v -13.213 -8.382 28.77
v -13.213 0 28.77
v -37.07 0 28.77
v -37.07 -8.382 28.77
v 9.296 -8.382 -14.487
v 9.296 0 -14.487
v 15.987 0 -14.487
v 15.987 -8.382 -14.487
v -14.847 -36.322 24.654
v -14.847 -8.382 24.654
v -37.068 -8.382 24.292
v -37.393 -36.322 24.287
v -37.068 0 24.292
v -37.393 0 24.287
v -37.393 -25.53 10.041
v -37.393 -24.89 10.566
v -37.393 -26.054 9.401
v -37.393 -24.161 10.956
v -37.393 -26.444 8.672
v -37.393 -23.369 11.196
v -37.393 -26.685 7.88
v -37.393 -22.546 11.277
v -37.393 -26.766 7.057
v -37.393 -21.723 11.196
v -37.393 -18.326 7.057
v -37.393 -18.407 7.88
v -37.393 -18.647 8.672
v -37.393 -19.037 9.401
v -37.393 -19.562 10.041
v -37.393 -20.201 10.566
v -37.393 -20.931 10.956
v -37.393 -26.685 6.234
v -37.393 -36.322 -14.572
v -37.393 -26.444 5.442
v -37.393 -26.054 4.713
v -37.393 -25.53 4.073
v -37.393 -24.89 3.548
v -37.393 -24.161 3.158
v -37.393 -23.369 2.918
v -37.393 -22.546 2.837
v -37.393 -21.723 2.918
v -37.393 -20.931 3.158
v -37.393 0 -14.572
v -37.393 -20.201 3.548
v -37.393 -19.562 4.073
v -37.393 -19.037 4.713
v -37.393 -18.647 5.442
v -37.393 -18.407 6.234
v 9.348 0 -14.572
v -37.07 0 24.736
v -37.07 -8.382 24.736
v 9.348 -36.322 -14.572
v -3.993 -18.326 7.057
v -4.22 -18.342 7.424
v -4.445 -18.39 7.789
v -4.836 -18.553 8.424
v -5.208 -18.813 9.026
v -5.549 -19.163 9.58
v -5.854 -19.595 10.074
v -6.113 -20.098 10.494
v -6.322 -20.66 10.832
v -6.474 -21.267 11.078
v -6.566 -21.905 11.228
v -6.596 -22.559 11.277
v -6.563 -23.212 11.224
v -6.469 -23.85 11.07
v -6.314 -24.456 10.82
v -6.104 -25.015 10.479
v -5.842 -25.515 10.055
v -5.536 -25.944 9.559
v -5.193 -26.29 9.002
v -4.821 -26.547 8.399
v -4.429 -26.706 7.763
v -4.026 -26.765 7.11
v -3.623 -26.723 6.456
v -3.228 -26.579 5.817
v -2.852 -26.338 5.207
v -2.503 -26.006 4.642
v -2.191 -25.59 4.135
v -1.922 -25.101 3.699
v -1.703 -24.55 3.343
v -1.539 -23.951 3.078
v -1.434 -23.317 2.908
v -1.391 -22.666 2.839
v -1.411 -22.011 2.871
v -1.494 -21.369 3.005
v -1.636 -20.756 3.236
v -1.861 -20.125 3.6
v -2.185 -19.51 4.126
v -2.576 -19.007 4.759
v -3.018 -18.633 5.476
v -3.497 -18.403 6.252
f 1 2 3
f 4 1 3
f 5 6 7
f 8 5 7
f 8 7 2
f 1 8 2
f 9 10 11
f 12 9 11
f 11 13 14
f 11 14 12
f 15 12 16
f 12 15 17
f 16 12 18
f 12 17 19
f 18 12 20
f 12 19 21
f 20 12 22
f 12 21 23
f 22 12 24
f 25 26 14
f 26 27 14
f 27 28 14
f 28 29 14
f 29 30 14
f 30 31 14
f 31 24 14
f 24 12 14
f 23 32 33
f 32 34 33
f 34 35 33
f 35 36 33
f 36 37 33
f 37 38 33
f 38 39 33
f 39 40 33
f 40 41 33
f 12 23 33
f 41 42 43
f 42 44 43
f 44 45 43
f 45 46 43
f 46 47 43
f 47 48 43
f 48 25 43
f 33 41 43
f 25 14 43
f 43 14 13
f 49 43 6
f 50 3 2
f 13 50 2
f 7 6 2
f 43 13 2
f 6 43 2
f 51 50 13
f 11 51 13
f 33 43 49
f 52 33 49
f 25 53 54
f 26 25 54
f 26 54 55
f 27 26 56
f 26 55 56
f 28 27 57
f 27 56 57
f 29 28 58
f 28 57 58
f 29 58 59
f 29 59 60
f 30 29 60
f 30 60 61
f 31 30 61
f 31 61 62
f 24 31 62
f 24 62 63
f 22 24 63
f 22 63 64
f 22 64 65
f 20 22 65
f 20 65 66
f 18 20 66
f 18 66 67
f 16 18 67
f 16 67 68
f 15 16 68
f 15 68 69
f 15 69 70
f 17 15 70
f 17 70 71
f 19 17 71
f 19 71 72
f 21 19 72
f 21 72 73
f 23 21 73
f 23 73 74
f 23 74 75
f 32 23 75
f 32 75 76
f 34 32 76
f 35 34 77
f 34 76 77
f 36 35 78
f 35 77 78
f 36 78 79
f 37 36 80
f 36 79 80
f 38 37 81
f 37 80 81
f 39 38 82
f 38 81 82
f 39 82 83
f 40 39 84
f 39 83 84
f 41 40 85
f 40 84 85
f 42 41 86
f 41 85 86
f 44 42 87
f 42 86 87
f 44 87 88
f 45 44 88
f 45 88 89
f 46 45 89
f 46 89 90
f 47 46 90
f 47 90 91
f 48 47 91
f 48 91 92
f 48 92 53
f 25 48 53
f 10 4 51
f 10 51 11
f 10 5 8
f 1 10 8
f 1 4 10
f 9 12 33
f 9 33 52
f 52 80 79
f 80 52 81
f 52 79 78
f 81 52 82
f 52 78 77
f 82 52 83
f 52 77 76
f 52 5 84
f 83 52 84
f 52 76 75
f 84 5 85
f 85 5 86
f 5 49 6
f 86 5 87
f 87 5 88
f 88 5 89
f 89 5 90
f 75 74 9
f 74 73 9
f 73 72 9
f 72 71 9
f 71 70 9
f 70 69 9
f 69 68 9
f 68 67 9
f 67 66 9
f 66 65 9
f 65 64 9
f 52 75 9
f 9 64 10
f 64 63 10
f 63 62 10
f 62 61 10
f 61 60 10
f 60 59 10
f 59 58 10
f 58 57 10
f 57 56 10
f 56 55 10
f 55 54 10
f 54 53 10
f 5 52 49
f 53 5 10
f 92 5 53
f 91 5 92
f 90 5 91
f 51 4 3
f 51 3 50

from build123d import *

# Parameters (mm, degrees)
F1_DEPTH = 36.322
F3_DEPTH = 8.382
F4_R     = 4.21986
F5_DEPTH = 46.736


with BuildPart() as f1:
    # F0 (on Front) → F1 (new body)
    with BuildSketch(Plane.XZ):
        Polygon((-14.847217, 24.653712), (-37.392989, 24.287116), (-37.392989, -14.572268), (9.348247, -14.572268), align=None)
    extrude(amount=F1_DEPTH)

    # F2 (on Front) → F3 (join)
    with BuildSketch(Plane.XZ):
        Polygon((-37.069924, 28.770359), (-37.069924, 24.735801), (-36.900819, -14.487034), (9.12904, -14.487034), (15.986776, -14.487034), (-13.213245, 28.770359), align=None)
    extrude(amount=F3_DEPTH)

    # F4 (on Right) → F5 (cut)
    with BuildSketch(Plane.YZ):
        with Locations((-22.545774, 7.057011)):
            Circle(F4_R)
    extrude(amount=-F5_DEPTH, mode=Mode.SUBTRACT)


solid = f1.part
